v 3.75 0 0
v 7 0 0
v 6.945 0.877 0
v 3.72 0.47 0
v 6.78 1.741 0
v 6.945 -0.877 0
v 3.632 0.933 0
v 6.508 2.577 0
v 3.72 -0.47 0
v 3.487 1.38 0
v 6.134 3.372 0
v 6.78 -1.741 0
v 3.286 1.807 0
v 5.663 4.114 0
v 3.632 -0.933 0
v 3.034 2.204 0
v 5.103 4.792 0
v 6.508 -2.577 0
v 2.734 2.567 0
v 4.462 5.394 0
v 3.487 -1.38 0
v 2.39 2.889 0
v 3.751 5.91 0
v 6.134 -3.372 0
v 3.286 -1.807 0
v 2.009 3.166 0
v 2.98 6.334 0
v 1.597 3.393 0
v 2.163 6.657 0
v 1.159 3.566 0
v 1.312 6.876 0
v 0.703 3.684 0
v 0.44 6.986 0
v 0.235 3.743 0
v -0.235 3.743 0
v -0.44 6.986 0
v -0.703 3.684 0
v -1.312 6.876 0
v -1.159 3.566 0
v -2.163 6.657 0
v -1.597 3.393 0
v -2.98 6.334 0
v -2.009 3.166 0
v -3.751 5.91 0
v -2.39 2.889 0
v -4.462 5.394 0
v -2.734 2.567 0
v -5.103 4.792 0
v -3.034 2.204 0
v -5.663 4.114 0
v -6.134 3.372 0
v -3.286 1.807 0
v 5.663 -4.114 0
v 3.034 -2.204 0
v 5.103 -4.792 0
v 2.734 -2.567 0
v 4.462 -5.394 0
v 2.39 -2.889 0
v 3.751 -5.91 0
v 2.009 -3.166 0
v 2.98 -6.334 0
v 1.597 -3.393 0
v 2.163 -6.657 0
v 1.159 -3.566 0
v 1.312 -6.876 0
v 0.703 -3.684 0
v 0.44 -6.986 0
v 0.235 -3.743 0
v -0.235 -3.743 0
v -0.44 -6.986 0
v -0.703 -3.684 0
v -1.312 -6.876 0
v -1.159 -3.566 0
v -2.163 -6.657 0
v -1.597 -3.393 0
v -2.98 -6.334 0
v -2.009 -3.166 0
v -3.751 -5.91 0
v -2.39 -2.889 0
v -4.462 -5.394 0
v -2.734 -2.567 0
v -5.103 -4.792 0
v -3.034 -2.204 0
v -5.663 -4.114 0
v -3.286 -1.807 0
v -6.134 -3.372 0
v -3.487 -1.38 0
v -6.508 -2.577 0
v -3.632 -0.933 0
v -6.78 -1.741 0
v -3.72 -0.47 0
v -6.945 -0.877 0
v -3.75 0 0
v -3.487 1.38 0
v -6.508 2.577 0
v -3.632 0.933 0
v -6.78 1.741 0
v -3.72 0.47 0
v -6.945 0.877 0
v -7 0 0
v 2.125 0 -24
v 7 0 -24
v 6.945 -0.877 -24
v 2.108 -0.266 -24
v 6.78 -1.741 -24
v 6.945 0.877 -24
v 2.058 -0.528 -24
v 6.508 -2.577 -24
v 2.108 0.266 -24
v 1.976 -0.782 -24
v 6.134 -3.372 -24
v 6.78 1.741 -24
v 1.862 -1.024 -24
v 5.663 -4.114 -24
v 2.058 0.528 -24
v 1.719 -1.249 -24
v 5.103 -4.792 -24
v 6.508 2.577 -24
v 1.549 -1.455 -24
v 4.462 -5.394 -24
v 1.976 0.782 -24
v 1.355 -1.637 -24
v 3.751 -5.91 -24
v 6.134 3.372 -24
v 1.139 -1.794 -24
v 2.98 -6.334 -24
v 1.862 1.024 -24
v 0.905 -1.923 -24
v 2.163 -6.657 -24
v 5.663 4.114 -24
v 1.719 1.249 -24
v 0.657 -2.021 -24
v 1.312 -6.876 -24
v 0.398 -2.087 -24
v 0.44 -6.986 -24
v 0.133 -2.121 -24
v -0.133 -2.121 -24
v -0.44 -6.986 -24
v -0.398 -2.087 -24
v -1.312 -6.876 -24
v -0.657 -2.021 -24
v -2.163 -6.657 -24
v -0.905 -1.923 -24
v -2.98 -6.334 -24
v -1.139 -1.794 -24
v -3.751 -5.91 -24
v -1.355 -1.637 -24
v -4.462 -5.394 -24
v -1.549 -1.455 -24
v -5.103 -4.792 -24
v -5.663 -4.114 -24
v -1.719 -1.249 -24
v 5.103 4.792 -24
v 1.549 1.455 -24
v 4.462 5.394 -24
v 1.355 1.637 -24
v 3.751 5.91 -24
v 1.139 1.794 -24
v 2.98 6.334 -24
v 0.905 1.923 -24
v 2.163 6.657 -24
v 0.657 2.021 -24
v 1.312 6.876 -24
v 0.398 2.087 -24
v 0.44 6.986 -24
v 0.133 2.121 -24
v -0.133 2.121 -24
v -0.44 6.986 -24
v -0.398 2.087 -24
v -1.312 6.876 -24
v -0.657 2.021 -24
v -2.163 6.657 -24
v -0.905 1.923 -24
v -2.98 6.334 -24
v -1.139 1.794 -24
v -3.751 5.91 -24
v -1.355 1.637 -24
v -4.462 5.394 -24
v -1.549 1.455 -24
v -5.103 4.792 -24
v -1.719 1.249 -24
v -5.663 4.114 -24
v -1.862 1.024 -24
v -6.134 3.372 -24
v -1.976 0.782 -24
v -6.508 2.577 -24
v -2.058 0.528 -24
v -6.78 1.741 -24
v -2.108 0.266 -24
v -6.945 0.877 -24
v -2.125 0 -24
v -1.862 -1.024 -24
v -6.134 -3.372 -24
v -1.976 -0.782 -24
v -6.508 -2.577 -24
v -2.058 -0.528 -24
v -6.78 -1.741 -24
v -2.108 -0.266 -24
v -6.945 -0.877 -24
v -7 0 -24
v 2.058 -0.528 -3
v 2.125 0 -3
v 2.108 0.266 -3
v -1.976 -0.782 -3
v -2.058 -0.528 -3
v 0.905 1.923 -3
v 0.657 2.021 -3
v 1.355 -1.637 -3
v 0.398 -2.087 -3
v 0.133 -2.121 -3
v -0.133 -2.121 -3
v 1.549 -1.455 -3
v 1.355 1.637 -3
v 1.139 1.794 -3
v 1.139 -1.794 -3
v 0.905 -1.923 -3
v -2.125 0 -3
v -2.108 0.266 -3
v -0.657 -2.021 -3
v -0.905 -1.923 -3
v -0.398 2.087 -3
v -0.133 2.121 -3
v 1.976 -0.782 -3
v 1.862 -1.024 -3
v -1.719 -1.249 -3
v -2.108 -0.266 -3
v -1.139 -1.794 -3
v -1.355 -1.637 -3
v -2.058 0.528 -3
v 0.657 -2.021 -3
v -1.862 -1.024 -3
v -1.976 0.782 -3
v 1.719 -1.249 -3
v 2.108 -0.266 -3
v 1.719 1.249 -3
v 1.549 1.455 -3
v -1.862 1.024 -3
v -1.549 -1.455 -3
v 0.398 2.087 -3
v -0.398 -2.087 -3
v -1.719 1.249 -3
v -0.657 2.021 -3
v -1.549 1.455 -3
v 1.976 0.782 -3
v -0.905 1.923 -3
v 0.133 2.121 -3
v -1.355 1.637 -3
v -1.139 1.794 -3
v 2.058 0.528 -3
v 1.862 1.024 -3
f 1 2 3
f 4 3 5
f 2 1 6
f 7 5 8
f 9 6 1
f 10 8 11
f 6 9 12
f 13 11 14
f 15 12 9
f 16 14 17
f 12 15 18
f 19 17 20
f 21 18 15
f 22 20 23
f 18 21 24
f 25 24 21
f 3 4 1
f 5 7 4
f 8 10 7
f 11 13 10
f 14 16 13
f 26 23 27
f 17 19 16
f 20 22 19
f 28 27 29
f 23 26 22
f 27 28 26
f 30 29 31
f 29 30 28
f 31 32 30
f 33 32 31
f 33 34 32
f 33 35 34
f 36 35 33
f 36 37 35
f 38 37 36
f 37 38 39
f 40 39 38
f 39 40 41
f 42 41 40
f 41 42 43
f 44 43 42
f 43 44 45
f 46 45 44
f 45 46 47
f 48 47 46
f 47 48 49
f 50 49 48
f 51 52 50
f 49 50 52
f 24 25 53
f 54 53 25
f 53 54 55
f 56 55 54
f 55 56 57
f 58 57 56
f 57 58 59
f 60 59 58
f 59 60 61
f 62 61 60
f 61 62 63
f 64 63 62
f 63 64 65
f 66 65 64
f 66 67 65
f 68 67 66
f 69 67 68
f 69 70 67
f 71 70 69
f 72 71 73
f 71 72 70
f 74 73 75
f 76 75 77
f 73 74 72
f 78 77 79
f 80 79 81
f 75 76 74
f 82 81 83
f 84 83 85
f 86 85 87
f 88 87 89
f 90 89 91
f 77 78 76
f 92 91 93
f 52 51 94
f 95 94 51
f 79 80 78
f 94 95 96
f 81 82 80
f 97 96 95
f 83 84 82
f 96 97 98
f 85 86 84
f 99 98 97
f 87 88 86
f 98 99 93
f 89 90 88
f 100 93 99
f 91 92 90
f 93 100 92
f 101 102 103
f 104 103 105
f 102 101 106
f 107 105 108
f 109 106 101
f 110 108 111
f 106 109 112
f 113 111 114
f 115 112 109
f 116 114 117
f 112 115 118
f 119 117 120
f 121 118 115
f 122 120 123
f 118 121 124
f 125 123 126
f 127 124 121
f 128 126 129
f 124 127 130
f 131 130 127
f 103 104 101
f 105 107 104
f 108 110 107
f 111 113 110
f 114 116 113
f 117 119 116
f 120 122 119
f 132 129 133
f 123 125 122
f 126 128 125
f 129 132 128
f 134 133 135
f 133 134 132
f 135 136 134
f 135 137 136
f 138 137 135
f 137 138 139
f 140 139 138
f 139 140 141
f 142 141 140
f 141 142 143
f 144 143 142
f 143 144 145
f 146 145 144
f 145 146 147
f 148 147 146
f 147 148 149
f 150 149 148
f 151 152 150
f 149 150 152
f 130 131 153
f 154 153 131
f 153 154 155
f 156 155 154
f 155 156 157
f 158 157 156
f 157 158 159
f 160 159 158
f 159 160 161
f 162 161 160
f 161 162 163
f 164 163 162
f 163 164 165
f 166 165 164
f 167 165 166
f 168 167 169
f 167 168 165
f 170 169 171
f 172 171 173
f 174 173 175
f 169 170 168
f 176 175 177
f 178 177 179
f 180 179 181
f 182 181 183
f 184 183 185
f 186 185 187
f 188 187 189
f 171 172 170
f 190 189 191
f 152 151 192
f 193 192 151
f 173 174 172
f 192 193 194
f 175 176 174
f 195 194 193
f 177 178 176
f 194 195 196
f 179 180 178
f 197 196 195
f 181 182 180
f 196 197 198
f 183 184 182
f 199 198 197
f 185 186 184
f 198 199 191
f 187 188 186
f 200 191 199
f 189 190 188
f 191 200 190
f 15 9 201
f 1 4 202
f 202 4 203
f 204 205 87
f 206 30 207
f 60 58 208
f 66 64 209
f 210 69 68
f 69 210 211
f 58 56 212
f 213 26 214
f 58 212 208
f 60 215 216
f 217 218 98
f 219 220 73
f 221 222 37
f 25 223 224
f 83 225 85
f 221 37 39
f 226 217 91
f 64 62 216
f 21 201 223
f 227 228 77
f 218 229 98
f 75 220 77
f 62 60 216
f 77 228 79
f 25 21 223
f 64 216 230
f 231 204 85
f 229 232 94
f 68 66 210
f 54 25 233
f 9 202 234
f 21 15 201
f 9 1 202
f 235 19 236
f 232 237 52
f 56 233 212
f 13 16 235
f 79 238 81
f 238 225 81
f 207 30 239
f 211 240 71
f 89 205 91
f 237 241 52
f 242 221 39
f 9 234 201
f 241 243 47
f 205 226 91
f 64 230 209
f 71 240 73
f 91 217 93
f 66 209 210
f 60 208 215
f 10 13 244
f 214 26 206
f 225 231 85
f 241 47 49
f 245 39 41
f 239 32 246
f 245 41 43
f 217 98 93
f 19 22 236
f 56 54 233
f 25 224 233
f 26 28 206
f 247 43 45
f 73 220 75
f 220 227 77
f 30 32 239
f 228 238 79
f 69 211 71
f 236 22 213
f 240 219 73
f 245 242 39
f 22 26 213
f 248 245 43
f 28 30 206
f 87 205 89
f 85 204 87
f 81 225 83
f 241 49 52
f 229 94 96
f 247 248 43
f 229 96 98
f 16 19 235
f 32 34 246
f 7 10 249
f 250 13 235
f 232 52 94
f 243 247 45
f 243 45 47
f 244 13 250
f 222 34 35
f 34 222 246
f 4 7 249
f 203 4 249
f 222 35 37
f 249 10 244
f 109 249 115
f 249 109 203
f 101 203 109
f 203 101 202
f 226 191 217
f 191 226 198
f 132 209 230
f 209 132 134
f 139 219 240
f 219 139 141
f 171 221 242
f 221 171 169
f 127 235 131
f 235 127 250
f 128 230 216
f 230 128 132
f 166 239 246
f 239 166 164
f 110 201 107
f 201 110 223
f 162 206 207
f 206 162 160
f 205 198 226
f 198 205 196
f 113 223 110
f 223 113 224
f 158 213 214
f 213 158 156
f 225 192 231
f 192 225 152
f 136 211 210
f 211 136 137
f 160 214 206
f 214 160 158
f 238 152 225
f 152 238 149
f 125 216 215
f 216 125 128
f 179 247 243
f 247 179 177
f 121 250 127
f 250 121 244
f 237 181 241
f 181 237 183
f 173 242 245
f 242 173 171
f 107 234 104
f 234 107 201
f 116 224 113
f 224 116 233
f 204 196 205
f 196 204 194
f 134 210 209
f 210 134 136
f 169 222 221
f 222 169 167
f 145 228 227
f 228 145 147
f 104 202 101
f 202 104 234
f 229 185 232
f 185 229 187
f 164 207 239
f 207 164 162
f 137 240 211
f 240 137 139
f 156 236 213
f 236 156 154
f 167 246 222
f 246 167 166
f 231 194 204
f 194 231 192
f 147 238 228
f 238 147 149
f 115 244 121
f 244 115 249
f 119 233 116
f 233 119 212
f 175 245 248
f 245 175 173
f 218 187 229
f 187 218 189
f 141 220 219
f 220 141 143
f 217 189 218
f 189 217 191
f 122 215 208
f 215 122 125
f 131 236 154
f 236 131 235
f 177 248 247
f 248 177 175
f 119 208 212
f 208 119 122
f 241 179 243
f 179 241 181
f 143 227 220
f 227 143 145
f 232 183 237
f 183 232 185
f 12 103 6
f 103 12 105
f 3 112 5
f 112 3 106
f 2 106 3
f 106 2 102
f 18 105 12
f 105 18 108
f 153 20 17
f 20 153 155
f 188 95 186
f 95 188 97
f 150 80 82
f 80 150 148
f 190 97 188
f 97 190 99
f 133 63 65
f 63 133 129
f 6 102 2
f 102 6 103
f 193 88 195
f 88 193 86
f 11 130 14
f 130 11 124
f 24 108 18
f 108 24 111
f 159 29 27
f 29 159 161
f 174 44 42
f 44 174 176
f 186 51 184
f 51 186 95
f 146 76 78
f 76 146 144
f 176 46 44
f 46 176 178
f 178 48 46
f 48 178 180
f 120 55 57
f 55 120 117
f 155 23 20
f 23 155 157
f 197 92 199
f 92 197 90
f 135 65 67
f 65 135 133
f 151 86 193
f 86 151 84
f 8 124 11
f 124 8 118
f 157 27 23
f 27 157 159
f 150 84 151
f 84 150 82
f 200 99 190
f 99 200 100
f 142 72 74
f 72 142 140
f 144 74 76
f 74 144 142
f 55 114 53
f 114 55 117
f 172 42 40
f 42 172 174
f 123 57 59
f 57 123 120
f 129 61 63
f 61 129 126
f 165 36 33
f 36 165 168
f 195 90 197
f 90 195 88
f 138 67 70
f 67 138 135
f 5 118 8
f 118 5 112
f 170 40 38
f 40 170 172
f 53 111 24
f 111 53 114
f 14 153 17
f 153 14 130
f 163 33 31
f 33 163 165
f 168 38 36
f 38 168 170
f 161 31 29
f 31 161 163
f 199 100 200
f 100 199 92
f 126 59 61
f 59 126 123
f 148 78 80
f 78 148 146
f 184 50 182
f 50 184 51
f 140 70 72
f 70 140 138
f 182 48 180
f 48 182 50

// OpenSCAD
$fn = 50;


difference() {
	union() {
		translate(v = [0, 0, -24.0000000000]) {
			cylinder(h = 24, r = 7.0000000000);
		}
	}
	union() {
		translate(v = [0, 0, 0]) {
			rotate(a = [0, 0, 0]) {
				difference() {
					union() {
						#translate(v = [0, 0, -24.0000000000]) {
							cylinder(h = 24, r = 2.0000000000);
						}
						#translate(v = [0, 0, -3]) {
							cylinder(h = 3, r = 7.0000000000, r1 = 2.1250000000, r2 = 3.7500000000);
						}
						#translate(v = [0, 0, -24.0000000000]) {
							cylinder(h = 24, r = 2.1250000000);
						}
						#translate(v = [0, 0, -24.0000000000]) {
							cylinder(h = 24, r = 2.0000000000);
						}
					}
					union();
				}
			}
		}
	}
}
